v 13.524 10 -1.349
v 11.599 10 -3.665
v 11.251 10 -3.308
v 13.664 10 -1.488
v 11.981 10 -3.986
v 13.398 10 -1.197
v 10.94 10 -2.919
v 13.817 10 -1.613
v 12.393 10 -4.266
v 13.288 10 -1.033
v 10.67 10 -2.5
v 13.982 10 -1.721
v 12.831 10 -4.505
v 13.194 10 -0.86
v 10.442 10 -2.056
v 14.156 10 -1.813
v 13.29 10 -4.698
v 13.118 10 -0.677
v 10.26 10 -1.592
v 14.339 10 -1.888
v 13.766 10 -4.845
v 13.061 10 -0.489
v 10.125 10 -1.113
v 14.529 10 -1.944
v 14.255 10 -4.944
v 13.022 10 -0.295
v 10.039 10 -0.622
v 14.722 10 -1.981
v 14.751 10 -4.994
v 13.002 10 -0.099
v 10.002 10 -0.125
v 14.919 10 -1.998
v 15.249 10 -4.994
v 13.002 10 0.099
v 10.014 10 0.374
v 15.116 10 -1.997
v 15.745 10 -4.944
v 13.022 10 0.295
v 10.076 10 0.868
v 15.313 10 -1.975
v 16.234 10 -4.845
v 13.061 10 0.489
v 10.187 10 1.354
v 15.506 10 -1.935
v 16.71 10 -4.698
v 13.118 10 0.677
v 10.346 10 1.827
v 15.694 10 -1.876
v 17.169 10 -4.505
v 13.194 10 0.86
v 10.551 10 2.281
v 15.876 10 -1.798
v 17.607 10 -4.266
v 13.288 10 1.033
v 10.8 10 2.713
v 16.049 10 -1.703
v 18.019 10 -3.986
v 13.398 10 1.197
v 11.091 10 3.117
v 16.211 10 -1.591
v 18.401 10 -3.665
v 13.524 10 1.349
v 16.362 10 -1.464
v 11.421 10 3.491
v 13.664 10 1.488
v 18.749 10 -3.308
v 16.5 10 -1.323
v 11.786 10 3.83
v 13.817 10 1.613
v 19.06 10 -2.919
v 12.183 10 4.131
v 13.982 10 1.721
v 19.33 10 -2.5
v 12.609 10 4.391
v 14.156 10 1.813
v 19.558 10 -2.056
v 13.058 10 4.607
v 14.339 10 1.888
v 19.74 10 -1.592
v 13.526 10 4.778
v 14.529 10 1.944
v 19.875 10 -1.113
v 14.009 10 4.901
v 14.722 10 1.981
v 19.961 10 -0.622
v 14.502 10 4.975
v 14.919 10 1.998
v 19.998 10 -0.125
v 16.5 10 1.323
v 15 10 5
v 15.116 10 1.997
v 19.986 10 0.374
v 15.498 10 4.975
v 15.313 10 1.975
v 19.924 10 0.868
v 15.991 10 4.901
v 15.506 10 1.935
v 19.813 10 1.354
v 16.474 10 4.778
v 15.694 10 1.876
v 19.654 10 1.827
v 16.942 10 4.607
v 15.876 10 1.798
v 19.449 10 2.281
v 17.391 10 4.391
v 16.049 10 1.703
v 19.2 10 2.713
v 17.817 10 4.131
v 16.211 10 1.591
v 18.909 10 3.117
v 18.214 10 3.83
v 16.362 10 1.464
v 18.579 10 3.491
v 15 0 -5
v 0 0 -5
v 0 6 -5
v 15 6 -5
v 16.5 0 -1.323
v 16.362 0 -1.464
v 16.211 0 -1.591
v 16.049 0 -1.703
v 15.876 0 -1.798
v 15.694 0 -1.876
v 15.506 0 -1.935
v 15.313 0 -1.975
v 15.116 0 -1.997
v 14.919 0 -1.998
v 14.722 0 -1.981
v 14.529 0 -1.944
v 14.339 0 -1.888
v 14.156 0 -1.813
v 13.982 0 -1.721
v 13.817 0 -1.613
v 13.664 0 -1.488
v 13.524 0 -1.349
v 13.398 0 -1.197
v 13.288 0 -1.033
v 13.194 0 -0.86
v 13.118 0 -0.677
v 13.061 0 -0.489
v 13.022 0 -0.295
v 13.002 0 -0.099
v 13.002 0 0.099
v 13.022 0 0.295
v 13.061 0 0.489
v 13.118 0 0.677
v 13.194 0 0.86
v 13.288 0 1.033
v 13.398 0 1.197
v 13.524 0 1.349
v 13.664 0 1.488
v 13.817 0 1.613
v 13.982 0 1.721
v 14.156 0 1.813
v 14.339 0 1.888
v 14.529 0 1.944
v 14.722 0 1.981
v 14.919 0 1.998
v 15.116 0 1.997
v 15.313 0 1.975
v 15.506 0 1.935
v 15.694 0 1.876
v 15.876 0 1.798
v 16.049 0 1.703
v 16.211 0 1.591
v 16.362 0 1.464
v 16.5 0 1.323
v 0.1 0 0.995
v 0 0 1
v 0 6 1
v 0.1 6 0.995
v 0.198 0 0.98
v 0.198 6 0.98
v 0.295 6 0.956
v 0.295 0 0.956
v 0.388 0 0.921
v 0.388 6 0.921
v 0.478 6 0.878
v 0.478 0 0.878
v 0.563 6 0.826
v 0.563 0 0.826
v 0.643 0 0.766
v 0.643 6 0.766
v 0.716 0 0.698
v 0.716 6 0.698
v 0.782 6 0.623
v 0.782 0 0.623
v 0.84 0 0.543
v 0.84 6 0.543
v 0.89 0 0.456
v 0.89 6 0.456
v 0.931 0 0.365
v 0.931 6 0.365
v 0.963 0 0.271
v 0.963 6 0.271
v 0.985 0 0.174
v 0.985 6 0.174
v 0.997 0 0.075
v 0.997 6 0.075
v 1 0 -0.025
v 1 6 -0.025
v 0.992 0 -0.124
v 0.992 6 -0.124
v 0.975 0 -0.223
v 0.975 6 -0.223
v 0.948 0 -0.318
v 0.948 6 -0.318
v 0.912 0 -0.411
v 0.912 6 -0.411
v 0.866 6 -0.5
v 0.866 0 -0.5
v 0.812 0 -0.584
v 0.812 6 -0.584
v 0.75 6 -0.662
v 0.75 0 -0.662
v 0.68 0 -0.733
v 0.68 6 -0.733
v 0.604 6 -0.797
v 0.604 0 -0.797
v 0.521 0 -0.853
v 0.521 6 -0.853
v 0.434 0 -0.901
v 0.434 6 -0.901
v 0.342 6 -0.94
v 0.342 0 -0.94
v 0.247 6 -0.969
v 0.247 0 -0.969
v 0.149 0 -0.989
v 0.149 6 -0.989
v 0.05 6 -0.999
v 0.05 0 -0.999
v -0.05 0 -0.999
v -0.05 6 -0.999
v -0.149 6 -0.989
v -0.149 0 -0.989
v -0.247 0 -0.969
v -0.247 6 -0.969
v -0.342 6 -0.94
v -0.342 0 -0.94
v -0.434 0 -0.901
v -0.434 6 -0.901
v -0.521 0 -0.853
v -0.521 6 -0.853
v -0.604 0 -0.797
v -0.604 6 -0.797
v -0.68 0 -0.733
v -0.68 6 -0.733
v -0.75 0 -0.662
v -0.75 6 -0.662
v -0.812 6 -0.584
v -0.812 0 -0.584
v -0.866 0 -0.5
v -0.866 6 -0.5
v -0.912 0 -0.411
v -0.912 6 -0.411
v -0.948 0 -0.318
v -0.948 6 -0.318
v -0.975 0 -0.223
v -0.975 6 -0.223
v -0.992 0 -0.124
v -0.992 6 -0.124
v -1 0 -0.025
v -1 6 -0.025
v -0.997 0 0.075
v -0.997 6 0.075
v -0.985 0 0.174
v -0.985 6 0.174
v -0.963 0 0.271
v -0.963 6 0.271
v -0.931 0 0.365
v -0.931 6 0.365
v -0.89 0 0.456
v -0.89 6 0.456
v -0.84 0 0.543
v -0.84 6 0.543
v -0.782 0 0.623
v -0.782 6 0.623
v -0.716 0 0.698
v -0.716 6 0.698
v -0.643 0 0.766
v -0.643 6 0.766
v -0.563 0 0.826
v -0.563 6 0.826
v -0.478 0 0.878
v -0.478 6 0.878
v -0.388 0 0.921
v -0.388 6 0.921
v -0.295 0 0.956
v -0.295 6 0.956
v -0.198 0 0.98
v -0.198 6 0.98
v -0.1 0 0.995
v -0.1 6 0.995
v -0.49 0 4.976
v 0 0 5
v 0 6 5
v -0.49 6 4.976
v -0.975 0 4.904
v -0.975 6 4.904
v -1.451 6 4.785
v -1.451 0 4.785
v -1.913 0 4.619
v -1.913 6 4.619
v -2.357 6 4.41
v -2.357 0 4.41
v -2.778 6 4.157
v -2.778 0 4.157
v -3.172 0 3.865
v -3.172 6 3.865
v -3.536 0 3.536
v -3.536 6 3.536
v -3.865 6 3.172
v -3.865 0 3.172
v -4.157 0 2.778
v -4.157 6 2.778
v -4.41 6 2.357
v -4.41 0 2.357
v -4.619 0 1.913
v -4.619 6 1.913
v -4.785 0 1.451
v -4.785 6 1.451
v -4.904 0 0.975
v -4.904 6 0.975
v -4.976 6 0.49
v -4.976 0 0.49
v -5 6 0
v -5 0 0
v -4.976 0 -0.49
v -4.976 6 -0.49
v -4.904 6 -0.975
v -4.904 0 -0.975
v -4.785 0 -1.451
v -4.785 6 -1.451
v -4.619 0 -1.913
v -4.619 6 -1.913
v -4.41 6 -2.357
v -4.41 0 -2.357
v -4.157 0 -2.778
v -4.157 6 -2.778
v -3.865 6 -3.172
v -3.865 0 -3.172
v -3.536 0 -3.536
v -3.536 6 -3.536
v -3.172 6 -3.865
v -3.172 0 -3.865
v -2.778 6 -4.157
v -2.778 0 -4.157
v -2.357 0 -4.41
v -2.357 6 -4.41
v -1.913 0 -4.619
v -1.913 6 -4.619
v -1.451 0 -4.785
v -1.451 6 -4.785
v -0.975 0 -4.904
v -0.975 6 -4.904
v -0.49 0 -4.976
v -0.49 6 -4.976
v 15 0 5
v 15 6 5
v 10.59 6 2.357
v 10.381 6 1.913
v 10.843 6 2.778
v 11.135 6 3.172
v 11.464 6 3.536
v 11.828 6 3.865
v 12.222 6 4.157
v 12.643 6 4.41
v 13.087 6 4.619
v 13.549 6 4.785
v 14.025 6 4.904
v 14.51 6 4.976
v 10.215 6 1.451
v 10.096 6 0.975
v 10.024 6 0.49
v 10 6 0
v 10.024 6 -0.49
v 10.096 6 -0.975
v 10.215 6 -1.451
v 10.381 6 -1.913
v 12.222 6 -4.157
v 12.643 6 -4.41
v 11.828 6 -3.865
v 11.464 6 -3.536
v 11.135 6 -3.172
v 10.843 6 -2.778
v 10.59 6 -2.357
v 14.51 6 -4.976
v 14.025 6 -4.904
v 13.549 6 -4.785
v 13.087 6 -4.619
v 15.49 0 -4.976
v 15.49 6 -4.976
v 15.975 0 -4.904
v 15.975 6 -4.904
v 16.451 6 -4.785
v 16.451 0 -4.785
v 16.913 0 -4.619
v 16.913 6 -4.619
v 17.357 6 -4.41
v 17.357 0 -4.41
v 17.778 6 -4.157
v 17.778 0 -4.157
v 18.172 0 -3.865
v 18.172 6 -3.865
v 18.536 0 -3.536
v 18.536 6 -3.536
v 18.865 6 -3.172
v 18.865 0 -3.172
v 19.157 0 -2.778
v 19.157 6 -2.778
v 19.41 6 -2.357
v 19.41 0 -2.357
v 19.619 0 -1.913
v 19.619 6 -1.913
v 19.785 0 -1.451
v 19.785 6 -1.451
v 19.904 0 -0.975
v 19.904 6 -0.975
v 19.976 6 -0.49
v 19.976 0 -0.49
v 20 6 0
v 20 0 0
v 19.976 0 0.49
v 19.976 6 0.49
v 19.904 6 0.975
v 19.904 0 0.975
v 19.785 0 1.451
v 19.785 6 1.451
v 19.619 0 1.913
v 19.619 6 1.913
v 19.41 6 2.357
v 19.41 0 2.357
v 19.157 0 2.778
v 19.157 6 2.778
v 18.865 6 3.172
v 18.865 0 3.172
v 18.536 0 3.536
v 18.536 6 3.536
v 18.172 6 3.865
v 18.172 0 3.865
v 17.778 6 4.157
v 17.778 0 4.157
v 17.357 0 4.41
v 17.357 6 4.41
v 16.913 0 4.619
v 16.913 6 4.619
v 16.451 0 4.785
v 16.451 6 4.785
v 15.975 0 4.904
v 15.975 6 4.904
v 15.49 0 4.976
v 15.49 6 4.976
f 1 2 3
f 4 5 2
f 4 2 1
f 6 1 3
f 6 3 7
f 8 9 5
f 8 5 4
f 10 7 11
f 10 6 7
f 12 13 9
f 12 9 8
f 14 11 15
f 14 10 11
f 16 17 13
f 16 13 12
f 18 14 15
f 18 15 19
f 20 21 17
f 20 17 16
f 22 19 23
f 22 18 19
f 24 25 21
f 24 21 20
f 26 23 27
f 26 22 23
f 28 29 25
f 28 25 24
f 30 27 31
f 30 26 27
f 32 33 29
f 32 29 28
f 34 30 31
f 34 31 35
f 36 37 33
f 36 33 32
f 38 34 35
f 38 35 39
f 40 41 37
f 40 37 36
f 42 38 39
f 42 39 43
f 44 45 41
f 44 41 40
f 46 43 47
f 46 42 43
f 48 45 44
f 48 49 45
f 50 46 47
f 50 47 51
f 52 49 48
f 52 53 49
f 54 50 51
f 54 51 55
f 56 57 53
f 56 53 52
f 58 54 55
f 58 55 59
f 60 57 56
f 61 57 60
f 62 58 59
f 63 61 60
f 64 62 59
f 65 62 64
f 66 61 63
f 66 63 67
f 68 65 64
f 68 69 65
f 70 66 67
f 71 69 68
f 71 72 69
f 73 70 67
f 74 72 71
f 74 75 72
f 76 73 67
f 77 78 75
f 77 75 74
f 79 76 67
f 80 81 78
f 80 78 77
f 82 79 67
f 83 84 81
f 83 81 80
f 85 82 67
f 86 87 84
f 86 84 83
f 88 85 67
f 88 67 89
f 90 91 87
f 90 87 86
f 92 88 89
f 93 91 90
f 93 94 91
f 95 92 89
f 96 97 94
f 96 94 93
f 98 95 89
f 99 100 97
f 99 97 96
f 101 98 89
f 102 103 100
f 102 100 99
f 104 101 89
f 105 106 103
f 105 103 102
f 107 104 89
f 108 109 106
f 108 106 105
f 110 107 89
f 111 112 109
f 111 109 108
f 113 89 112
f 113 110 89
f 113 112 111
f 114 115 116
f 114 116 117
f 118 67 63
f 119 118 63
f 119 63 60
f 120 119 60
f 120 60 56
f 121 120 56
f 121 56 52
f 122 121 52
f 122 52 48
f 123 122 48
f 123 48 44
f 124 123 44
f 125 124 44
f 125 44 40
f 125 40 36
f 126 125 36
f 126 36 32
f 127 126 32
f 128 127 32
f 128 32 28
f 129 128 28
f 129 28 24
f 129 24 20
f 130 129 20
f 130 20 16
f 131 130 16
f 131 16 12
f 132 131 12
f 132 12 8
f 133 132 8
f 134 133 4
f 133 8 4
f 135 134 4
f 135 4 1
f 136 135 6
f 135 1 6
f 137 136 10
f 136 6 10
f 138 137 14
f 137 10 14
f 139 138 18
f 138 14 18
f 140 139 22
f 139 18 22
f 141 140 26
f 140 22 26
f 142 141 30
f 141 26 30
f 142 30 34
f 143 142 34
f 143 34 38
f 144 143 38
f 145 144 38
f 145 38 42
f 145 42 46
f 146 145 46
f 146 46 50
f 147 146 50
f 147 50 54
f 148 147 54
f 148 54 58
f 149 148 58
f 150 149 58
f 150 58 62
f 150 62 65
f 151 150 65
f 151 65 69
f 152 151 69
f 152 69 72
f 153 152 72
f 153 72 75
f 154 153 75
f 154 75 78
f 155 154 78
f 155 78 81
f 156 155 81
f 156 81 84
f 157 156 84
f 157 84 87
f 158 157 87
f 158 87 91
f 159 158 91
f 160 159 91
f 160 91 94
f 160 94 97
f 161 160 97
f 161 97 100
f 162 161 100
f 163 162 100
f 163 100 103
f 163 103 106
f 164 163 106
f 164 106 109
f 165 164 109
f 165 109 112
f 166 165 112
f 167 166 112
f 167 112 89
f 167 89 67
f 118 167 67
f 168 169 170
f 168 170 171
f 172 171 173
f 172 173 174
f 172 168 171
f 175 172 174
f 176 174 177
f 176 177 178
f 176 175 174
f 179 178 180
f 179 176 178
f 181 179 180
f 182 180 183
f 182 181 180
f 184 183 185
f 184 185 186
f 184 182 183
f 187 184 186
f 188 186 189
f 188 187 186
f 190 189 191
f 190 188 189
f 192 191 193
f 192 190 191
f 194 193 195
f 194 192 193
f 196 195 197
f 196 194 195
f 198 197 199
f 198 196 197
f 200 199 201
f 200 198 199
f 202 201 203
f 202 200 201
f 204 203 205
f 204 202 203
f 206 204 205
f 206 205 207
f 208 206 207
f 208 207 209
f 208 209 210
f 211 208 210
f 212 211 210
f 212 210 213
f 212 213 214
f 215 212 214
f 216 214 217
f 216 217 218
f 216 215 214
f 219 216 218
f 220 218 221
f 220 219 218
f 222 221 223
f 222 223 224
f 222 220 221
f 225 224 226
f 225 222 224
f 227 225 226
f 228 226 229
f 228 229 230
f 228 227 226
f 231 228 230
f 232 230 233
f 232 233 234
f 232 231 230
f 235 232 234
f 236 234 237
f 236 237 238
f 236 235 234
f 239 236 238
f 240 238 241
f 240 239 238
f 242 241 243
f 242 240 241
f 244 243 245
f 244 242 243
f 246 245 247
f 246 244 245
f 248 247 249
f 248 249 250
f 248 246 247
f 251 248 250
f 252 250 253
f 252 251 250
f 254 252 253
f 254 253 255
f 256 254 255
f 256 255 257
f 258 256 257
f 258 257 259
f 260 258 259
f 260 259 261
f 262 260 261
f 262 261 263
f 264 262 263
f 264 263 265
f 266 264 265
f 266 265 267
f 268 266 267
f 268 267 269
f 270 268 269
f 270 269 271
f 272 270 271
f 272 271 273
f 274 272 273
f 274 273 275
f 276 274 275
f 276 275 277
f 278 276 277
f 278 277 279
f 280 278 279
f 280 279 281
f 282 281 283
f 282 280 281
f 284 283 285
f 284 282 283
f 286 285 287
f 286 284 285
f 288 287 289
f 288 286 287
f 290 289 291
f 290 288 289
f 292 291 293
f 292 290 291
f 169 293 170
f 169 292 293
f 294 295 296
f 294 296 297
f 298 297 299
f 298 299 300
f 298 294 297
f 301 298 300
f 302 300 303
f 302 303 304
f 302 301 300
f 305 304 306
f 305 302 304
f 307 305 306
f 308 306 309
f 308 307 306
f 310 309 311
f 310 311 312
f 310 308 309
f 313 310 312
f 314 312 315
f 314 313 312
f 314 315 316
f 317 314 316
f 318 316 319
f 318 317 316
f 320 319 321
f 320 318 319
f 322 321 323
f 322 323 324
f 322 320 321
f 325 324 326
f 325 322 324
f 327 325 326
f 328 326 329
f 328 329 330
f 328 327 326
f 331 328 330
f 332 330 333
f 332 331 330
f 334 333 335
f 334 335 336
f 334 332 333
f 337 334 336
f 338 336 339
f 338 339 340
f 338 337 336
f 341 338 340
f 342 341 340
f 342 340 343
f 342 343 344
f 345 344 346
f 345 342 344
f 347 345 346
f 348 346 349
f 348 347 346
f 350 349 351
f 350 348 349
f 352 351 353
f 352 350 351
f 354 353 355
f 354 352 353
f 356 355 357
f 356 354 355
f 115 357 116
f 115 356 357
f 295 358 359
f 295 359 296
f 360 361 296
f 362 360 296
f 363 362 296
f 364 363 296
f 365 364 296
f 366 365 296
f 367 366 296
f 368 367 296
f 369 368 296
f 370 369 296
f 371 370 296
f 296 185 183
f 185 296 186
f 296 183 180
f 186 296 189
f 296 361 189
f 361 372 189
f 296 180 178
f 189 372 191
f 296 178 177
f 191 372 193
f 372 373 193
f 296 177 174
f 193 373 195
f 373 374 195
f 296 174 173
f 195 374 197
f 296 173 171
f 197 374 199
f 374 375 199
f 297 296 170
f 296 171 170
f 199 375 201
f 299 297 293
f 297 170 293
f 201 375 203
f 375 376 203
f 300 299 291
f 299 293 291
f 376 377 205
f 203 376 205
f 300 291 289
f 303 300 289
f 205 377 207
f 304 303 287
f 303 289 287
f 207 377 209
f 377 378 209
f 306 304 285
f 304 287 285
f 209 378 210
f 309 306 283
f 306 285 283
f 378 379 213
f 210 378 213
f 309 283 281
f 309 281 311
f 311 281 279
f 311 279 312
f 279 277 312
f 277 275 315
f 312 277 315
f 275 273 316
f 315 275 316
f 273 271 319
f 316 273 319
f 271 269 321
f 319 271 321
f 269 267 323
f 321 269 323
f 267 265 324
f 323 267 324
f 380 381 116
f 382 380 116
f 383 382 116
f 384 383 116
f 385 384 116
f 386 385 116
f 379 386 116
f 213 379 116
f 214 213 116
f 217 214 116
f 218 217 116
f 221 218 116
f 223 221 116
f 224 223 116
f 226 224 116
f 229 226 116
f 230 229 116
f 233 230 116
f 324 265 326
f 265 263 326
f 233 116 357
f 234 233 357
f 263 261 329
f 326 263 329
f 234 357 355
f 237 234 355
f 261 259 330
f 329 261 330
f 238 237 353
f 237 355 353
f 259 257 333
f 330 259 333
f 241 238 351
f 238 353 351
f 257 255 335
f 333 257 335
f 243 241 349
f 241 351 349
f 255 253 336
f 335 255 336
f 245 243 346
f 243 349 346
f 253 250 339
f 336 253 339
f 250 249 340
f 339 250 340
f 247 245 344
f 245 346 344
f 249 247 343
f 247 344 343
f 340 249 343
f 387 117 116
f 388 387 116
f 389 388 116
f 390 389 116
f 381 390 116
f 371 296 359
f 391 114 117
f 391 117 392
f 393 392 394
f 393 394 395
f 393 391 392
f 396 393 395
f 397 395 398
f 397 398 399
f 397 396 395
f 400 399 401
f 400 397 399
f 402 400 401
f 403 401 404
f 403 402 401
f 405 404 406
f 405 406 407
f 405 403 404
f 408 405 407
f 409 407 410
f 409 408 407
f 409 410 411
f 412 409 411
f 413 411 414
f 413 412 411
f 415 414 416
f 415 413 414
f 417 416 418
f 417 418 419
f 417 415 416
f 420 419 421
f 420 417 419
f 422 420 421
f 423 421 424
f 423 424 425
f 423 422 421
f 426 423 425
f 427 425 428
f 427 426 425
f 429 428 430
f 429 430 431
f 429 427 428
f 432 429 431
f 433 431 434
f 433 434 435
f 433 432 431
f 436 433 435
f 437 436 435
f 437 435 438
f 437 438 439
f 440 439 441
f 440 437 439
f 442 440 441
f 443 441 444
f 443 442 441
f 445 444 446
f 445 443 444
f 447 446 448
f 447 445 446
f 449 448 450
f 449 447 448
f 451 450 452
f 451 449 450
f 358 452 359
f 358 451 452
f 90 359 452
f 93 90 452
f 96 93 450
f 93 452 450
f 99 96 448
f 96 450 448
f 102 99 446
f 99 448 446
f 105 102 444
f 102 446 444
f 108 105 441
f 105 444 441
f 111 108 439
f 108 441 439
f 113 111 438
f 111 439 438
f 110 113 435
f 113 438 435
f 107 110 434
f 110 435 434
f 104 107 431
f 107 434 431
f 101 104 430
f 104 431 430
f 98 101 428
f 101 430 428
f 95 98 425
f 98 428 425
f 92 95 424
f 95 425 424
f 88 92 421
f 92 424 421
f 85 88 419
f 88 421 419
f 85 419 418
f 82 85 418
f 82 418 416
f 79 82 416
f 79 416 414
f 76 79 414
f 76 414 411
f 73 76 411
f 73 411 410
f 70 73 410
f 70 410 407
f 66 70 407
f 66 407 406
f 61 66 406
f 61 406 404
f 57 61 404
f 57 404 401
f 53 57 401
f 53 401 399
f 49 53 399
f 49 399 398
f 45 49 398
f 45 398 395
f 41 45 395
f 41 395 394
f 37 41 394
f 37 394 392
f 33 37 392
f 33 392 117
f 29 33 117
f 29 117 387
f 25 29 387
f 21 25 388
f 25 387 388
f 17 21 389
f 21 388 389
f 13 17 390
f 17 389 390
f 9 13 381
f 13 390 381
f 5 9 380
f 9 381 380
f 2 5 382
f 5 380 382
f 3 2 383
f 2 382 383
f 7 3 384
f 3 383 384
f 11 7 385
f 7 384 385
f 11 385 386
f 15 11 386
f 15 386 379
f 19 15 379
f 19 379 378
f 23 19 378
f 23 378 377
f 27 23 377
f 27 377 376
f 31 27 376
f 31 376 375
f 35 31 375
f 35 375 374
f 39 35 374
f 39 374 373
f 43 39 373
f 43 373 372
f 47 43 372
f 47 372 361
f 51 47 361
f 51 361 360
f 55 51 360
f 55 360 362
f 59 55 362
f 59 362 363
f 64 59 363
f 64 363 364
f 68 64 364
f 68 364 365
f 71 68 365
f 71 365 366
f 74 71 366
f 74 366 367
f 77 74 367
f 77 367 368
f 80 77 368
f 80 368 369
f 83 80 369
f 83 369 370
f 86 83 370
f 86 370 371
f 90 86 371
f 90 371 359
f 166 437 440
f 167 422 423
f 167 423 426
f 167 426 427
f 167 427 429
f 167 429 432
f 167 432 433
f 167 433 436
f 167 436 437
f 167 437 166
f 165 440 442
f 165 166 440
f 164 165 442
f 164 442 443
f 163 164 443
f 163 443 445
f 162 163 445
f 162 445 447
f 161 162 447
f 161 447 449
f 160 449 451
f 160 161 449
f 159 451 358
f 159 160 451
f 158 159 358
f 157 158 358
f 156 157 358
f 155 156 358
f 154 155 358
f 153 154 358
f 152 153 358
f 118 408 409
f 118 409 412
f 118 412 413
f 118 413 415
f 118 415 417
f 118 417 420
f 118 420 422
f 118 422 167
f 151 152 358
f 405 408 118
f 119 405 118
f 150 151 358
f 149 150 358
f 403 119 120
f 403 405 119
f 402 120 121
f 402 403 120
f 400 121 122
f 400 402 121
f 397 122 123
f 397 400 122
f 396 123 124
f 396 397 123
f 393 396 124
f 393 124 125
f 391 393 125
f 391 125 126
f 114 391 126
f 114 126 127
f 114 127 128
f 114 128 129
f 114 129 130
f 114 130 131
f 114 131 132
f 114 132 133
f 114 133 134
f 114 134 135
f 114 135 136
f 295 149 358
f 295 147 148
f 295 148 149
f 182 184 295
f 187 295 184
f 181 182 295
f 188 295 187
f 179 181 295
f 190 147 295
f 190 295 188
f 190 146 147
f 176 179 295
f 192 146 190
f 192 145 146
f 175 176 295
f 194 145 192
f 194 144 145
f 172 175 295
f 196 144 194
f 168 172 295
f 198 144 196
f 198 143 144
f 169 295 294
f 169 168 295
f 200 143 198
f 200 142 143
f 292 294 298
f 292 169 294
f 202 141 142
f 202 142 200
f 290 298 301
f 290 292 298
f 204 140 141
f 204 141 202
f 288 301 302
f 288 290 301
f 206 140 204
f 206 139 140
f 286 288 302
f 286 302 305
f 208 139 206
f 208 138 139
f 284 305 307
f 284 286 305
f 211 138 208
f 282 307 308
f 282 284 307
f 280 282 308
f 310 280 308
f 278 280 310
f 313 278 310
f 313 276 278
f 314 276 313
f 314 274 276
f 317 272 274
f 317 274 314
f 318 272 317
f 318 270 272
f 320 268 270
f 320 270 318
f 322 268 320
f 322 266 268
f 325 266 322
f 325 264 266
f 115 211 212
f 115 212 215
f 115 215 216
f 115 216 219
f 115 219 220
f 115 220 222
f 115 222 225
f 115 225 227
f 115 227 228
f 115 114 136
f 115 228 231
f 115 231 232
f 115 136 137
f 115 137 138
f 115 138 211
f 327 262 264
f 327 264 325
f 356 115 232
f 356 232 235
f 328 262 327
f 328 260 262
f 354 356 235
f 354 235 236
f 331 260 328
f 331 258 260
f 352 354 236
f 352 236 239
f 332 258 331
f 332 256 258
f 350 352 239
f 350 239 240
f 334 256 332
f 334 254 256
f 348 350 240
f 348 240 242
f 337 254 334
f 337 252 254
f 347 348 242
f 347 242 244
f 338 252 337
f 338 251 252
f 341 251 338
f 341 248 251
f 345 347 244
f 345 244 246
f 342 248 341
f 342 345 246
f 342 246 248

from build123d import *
from build123d.topology import SkipClean

# Parameters (mm, degrees)
SKETCH1_R           = 1
BOSS_EXTRUDE1_DEPTH = 6
SKETCH2_R           = 5
BOSS_EXTRUDE2_DEPTH = 4
CUT_EXTRUDE1_DEPTH  = 23.912878475


with BuildPart() as part:
    # Sketch1 → Boss-Extrude1 (new body)
    with BuildSketch(Plane(origin=(0, 0, 0), x_dir=(1, 0, 0), z_dir=(0, 1, 0))):
        with BuildLine():
            Line((0, 5), (15, 5))
            ThreePointArc((15, 5), (20, 0), (15, -5))
            Line((15, -5), (0, -5))
            ThreePointArc((0, -5), (-5, 0), (0, 5))
        make_face()
        Circle(SKETCH1_R, mode=Mode.SUBTRACT)
    extrude(amount=BOSS_EXTRUDE1_DEPTH)

    # Sketch2 → Boss-Extrude2 (add)
    with SkipClean():  # the faces are left unmerged after this step: merging them gives an invalid solid
        with BuildSketch(Plane(origin=(0, 6, 0), x_dir=(1, 0, 0), z_dir=(0, 1, 0))):
            with Locations((15, 0)):
                Circle(SKETCH2_R)
        extrude(amount=BOSS_EXTRUDE2_DEPTH)
    add(part.part.scale(1), mode=Mode.REPLACE)  # the faces are merged on a copy

    # Sketch3 → Cut-Extrude1 (cut, through all)
    with BuildSketch(Plane(origin=(0, 10, 0), x_dir=(1, 0, 0), z_dir=(0, 1, 0))):
        with BuildLine():
            Line((16.5, -1.322875656), (16.5, 1.322875656))
            ThreePointArc((16.5, 1.322875656), (13, 0), (16.5, -1.322875656))
        make_face()
    extrude(amount=-CUT_EXTRUDE1_DEPTH, mode=Mode.SUBTRACT)


solid = part.part
